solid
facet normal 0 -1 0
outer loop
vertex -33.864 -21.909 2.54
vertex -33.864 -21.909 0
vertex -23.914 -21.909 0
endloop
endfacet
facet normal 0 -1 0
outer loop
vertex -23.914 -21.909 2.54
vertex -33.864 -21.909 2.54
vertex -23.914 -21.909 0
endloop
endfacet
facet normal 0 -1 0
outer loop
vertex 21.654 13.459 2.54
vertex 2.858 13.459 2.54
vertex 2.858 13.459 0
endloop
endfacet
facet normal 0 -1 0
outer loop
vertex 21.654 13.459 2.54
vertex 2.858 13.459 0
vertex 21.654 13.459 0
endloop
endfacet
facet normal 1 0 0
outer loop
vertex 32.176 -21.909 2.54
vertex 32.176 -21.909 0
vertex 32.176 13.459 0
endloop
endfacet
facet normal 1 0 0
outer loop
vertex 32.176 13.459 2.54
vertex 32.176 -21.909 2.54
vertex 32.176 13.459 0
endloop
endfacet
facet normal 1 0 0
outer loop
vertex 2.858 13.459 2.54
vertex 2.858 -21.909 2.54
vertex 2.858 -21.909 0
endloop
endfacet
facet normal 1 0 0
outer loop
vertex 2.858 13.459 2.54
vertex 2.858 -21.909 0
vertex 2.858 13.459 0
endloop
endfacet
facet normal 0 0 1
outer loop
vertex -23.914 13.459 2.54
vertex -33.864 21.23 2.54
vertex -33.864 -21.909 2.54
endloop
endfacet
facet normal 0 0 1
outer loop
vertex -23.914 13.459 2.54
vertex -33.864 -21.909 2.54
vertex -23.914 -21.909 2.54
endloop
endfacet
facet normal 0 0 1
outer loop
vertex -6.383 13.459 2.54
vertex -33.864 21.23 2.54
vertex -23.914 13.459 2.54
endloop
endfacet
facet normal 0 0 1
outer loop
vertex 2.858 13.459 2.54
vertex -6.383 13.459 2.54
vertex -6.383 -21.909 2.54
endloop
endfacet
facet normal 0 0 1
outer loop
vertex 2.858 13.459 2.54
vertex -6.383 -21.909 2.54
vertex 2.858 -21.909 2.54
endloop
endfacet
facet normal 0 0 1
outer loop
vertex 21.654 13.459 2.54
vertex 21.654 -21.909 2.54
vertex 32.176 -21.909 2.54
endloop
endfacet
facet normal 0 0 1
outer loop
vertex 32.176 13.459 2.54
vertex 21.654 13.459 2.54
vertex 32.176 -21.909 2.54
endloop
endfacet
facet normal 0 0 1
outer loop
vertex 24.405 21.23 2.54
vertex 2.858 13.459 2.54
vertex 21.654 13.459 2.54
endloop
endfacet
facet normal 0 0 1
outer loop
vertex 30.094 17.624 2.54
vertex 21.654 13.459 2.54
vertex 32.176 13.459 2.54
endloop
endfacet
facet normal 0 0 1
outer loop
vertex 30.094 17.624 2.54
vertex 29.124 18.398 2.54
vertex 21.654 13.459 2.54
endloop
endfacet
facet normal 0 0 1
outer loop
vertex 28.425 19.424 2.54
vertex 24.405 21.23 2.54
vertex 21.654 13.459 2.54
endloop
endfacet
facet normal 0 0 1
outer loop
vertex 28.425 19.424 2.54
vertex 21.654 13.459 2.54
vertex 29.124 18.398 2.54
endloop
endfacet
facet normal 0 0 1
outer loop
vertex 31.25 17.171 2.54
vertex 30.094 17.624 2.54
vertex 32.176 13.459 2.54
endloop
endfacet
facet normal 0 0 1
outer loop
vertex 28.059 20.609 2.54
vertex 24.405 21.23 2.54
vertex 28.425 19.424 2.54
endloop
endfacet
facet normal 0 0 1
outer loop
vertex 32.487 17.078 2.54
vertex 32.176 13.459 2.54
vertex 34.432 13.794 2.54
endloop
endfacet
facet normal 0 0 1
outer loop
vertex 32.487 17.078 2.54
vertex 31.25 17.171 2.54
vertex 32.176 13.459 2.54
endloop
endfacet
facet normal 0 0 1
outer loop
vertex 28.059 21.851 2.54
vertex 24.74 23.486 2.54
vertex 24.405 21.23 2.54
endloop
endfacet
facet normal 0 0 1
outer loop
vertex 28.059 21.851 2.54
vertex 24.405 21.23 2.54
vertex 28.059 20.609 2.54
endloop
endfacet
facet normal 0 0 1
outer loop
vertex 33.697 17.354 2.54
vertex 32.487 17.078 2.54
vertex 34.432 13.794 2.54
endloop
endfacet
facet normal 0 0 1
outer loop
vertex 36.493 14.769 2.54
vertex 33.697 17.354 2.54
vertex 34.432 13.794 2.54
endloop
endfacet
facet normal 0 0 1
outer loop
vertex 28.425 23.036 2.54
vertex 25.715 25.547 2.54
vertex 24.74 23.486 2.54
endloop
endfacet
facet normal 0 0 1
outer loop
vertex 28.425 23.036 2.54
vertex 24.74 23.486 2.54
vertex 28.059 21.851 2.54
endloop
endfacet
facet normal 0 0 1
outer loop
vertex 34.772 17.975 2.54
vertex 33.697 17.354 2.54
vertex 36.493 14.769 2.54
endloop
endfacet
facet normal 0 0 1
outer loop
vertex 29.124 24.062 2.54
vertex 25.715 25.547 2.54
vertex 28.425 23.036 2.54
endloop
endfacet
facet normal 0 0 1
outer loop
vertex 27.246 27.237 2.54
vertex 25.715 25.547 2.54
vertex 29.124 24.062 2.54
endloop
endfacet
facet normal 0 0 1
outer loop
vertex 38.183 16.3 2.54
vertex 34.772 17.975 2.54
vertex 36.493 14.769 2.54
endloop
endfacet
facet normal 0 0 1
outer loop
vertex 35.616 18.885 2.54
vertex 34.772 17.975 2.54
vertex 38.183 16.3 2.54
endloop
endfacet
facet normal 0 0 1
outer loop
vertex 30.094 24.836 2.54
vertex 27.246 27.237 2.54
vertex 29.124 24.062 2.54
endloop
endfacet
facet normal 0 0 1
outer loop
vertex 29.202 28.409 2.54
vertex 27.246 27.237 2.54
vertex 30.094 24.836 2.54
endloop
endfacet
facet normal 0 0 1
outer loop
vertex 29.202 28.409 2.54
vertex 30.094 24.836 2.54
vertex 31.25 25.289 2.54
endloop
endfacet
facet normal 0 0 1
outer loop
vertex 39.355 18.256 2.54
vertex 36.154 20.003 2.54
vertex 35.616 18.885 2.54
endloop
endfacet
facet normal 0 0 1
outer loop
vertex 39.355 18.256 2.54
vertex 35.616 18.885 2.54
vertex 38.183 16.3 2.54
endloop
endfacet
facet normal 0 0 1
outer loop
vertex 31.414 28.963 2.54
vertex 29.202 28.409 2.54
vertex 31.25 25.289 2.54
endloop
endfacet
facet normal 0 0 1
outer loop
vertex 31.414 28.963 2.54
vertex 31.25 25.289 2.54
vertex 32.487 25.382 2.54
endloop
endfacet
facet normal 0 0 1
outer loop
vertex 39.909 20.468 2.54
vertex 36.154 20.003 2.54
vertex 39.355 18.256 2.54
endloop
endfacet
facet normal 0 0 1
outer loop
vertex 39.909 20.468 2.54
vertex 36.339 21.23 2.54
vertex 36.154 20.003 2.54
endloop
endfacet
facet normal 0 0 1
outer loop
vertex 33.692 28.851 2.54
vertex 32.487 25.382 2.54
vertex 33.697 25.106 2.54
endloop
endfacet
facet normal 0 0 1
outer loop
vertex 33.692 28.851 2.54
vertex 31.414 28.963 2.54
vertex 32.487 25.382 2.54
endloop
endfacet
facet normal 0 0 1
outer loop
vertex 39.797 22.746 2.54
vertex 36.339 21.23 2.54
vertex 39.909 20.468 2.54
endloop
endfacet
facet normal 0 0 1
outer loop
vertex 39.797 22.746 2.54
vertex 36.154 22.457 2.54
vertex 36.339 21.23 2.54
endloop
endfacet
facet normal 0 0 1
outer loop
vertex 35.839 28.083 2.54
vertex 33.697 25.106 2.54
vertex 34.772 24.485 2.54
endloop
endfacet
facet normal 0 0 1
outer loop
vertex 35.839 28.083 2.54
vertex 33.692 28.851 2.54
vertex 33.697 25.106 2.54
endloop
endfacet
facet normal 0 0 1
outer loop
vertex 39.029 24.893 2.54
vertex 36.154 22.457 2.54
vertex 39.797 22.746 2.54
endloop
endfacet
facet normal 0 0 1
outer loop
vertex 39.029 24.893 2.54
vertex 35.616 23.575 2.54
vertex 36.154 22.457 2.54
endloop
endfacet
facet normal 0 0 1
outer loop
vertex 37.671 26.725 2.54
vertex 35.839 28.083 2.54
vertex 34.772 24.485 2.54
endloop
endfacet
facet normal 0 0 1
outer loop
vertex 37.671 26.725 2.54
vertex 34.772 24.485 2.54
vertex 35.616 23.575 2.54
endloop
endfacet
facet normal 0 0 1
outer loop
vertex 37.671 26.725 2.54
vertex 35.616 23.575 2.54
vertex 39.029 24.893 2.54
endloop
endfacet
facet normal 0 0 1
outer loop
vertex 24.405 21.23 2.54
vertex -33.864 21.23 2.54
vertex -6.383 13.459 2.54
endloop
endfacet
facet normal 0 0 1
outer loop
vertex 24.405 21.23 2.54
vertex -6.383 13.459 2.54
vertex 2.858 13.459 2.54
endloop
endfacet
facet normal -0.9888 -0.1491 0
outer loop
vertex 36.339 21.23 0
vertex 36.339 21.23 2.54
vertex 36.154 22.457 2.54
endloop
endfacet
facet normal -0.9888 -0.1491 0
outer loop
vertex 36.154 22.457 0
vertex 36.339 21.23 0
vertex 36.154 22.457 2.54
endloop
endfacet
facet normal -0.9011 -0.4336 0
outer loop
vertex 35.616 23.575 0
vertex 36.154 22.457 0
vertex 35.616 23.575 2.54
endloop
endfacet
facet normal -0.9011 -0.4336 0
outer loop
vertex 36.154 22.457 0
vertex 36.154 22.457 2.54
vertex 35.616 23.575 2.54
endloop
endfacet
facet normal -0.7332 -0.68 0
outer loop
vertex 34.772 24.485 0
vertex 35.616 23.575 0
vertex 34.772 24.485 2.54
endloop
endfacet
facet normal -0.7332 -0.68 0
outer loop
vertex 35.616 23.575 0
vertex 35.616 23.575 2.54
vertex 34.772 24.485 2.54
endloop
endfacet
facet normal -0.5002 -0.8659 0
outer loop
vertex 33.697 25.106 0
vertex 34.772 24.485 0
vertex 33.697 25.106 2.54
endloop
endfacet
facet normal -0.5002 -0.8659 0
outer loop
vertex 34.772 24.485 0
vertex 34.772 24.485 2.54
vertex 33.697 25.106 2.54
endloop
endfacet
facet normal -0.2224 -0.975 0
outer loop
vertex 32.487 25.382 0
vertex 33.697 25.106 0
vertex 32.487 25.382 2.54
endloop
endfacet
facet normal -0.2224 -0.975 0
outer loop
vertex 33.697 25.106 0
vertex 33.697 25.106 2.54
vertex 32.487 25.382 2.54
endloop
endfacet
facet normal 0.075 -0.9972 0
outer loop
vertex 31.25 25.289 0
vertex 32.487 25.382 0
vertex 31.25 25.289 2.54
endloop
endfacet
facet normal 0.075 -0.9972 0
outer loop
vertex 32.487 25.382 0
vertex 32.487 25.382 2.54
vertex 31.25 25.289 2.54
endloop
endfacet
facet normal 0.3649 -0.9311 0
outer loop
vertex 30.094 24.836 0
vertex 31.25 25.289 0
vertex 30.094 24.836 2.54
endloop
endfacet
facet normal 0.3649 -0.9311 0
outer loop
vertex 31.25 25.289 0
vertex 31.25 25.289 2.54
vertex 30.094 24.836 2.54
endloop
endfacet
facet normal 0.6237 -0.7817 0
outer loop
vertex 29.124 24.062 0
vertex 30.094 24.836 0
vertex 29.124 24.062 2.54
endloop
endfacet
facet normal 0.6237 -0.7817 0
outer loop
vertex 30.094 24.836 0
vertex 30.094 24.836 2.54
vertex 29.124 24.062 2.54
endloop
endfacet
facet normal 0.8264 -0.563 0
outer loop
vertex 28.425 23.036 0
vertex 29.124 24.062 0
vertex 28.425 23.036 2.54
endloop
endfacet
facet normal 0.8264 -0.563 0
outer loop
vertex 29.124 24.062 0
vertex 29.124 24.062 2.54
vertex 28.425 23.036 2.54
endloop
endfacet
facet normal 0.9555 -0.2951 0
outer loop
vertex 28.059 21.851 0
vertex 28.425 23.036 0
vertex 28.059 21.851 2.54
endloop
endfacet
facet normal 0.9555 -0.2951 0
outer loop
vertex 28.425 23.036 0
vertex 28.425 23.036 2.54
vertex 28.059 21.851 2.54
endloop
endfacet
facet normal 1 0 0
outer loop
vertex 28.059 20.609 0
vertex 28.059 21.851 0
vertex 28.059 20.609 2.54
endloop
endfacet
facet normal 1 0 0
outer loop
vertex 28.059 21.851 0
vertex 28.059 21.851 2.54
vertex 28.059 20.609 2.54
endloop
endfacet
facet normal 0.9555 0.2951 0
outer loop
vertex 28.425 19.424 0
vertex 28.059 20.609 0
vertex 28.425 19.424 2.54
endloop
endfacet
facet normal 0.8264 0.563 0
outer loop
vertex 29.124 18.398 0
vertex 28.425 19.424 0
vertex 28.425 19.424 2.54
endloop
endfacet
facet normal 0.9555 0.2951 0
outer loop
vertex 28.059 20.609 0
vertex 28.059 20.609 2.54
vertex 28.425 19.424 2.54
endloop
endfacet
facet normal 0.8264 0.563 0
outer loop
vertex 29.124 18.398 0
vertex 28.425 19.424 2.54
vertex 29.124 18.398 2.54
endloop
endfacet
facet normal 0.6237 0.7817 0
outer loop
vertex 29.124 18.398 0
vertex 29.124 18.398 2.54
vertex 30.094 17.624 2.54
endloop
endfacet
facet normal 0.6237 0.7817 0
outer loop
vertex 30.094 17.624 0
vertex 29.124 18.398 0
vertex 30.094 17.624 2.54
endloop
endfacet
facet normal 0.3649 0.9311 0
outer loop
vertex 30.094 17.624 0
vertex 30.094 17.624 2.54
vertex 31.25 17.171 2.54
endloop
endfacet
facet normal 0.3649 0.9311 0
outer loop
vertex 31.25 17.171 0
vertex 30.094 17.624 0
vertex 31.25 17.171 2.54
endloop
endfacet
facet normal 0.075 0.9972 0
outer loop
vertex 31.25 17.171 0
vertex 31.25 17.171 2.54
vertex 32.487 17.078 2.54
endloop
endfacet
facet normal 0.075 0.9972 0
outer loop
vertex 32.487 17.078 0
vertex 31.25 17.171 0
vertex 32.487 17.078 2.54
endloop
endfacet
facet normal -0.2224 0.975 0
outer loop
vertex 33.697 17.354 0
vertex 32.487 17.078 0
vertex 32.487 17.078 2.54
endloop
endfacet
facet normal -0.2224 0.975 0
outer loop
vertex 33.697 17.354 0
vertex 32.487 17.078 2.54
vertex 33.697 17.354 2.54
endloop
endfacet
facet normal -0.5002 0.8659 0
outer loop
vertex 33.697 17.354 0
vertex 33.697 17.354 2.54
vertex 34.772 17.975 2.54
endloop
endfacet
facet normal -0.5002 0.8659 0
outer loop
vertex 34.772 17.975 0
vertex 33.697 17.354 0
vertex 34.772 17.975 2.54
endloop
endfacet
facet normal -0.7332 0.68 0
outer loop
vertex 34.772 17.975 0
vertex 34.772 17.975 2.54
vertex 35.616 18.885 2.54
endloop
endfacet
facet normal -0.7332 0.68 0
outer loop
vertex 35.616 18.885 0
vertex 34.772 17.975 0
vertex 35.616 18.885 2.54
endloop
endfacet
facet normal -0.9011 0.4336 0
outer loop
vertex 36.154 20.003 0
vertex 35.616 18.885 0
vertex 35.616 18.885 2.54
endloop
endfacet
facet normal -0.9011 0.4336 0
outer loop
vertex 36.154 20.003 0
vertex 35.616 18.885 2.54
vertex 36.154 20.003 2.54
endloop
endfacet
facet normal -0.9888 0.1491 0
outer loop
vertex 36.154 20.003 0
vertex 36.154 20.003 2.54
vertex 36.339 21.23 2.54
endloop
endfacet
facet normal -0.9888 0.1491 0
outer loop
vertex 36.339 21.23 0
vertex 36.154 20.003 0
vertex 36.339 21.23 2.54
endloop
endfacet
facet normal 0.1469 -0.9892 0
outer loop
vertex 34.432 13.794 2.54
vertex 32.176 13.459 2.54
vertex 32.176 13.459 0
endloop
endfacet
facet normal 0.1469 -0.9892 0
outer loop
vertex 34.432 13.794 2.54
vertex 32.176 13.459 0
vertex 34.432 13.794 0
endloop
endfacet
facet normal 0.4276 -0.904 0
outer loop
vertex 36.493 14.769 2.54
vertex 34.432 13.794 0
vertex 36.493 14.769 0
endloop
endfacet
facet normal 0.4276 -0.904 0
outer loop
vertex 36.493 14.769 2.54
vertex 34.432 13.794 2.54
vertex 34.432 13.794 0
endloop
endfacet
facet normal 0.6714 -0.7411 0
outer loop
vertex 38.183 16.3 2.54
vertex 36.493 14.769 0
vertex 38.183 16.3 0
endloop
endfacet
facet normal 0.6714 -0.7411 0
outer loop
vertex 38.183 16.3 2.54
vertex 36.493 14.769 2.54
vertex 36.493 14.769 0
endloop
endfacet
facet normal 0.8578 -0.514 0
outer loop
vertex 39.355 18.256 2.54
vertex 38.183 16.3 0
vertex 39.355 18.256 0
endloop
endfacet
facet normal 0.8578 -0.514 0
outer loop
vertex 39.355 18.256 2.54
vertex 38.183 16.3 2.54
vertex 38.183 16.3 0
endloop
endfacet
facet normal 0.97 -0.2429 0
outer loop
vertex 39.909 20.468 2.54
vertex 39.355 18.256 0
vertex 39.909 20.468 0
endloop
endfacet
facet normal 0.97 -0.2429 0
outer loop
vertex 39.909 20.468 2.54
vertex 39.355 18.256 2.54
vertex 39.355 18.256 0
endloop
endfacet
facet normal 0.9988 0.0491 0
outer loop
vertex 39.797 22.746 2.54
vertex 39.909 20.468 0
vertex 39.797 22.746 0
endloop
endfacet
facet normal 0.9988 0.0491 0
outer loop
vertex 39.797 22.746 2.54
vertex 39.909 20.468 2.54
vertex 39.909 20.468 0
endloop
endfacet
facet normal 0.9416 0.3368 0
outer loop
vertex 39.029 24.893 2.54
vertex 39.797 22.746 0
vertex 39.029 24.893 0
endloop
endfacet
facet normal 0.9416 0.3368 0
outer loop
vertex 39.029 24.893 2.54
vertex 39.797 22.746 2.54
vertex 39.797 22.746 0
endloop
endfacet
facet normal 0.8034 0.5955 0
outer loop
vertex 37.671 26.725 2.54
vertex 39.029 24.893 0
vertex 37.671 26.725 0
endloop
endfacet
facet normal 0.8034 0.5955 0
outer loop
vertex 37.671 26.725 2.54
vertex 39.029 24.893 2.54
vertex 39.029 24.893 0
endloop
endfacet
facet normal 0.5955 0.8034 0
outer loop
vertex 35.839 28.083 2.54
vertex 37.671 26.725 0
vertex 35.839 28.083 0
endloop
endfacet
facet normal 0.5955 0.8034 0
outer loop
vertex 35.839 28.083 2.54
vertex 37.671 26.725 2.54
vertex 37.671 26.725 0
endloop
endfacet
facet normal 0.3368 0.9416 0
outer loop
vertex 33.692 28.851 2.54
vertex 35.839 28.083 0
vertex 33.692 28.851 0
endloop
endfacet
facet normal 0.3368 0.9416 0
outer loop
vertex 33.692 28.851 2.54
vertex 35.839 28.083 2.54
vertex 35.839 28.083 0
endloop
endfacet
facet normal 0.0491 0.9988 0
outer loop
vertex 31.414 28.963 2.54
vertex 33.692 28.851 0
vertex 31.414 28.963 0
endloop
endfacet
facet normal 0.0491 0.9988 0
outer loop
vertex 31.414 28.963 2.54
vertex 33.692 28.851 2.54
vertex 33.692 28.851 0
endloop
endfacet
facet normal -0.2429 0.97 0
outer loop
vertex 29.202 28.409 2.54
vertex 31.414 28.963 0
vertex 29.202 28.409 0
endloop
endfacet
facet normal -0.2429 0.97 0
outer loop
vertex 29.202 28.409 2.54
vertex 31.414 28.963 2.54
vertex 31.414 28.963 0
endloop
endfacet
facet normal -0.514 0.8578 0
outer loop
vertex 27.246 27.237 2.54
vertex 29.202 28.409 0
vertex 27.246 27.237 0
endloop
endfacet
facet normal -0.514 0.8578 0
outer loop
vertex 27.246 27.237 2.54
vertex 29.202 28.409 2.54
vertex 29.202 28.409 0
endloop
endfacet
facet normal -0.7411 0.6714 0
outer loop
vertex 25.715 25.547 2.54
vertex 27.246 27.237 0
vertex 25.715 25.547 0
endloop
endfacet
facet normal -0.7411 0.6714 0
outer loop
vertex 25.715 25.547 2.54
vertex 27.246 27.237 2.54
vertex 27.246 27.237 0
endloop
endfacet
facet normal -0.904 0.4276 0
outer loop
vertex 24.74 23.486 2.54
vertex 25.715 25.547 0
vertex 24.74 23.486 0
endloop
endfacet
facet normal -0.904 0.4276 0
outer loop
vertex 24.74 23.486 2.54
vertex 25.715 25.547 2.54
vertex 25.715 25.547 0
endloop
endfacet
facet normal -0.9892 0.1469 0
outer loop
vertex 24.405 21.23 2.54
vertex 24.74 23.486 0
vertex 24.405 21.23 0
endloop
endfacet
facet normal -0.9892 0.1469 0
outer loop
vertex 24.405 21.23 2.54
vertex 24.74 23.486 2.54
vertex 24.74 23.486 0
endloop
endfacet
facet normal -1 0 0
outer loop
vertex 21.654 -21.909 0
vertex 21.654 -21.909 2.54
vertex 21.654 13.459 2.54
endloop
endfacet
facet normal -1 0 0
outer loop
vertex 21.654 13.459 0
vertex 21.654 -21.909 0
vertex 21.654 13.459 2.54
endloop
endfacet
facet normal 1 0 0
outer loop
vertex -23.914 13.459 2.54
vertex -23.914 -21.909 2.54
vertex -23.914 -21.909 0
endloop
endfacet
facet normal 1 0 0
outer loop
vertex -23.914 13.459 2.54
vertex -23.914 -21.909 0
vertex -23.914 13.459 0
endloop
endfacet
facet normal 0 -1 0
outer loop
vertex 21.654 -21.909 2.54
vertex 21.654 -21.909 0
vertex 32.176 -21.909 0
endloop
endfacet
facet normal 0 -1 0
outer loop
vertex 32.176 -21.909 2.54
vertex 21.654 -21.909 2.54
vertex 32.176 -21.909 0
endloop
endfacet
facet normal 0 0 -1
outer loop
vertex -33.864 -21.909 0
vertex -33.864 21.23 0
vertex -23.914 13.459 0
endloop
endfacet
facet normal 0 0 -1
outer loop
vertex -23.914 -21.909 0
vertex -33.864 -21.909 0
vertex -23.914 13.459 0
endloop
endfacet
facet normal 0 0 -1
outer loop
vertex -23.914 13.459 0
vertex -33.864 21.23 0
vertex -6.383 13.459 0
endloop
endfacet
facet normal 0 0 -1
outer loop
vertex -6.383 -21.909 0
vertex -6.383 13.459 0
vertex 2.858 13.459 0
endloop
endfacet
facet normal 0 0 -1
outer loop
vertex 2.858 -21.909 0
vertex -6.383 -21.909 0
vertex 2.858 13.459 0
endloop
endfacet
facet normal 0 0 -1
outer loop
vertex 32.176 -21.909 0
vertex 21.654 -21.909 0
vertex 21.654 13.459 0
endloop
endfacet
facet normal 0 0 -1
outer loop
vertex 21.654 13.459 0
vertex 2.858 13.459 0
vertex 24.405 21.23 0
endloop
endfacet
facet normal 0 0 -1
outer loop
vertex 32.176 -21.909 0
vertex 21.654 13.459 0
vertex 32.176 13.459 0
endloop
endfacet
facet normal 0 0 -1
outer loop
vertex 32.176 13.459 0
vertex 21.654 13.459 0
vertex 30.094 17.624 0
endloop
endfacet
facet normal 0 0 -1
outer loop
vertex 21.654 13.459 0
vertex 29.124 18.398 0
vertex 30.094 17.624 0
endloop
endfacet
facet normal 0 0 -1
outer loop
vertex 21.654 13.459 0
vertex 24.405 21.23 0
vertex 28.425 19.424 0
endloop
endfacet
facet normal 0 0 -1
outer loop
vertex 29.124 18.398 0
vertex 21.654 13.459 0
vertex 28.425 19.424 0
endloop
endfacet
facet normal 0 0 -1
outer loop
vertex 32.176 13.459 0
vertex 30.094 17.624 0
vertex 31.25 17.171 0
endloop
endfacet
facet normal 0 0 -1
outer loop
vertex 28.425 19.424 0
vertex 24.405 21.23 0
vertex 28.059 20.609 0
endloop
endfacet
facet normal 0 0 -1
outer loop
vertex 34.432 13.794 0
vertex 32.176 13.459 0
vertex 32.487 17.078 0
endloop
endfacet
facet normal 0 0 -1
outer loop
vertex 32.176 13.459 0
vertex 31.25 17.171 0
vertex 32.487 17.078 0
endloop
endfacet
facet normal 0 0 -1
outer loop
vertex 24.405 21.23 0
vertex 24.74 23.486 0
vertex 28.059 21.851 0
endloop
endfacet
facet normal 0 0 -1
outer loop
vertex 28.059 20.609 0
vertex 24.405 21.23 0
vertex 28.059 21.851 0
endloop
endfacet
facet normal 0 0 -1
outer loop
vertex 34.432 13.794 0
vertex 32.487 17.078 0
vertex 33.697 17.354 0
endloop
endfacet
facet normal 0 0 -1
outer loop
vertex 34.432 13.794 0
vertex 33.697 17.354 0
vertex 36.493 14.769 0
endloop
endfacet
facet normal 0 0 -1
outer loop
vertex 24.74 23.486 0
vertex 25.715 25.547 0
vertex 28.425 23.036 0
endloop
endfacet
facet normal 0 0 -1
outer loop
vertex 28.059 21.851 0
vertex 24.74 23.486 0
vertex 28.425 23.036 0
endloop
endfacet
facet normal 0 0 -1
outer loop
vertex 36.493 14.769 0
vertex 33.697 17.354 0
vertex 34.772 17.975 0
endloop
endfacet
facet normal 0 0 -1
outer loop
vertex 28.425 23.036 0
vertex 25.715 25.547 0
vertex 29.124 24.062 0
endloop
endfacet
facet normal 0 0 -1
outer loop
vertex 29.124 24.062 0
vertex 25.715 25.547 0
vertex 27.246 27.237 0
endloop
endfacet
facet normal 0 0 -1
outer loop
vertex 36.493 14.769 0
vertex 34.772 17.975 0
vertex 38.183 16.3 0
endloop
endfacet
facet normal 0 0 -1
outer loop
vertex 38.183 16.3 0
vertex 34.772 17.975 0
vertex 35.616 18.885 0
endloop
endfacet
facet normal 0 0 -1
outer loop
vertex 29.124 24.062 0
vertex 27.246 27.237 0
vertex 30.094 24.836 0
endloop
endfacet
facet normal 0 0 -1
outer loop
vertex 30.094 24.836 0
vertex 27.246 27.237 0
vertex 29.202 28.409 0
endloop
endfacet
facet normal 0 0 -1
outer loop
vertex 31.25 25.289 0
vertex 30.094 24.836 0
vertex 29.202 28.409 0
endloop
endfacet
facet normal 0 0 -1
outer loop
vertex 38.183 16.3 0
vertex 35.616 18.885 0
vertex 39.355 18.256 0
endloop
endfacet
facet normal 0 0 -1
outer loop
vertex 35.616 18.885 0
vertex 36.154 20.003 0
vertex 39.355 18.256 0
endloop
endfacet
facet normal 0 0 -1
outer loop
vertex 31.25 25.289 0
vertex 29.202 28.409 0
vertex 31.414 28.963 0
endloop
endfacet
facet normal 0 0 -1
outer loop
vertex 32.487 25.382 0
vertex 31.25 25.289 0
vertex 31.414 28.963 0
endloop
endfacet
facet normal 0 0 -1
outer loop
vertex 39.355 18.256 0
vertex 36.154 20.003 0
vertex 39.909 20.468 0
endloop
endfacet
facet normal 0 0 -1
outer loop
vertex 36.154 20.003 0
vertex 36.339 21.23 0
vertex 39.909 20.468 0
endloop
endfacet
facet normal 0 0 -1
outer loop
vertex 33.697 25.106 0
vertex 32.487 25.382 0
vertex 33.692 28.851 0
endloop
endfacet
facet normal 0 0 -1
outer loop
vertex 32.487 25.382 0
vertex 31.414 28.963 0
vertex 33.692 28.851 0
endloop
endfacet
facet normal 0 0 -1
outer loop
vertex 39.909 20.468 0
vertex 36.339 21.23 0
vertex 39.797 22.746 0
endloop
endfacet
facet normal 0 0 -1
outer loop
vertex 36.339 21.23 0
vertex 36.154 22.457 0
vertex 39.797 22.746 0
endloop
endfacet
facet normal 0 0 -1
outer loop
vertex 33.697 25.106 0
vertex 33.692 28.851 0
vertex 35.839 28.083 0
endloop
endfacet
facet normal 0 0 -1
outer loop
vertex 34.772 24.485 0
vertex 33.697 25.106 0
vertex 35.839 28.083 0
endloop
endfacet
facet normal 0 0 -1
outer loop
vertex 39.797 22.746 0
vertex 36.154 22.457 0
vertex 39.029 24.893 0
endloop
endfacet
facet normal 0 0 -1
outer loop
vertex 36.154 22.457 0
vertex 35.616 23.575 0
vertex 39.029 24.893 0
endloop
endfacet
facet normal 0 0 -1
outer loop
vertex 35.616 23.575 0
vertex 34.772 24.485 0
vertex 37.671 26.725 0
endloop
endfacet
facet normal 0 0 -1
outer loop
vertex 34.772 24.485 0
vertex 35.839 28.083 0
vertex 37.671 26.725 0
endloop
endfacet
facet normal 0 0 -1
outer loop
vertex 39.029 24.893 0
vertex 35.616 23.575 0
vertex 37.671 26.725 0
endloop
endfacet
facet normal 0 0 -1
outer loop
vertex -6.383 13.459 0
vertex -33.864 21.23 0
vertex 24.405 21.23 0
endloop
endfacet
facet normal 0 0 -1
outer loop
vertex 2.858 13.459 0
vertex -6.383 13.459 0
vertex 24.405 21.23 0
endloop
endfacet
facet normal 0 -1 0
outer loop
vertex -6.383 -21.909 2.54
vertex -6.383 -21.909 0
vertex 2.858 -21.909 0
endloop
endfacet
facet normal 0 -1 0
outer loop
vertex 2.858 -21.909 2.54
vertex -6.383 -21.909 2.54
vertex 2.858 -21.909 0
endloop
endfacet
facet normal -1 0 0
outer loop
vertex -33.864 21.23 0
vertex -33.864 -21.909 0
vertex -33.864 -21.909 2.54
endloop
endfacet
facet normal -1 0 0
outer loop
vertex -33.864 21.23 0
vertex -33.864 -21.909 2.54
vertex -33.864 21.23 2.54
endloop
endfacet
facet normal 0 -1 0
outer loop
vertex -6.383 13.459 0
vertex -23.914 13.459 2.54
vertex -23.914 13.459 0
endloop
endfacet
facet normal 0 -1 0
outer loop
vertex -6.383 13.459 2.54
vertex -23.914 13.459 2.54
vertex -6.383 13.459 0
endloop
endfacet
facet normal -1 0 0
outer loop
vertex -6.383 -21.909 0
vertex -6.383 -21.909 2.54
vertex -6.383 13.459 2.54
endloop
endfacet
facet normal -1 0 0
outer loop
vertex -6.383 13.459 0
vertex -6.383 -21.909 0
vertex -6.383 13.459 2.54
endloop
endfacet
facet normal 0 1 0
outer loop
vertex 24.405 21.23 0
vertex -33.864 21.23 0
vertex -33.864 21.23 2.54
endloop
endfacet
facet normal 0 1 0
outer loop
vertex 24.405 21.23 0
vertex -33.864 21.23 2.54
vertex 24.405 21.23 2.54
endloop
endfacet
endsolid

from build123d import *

# Parameters (mm, degrees)
F0_W     = 66.04
F0_H     = 43.139034
F1_DEPTH = 2.54
F2_W     = 18.795862
F2_H     = 35.368388
F3_DEPTH = 25.4
F4_W     = 17.531056
F4_H     = 35.368388
F5_DEPTH = 25.4
F6_R     = 7.770645
F7_DEPTH = 2.54
F8_R     = 4.163339
F9_DEPTH = 25.4


with BuildPart() as f1:
    # F0 (on Top) → F1 (new body)
    with BuildSketch(Plane.XY):
        with Locations((-0.843987, -0.339514)):
            Rectangle(F0_W, F0_H)
    extrude(amount=F1_DEPTH)

    # F2 (on face) → F3 (cut)
    with BuildSketch(Plane.XY.offset(2.54)):
        with Locations((12.255906, -4.224837)):
            Rectangle(F2_W, F2_H)
    extrude(amount=-F3_DEPTH, mode=Mode.SUBTRACT)

    # F4 (on face) → F5 (cut)
    with BuildSketch(Plane.XY.offset(2.54)):
        with Locations((-15.148921, -4.224837)):
            Rectangle(F4_W, F4_H)
    extrude(amount=-F5_DEPTH, mode=Mode.SUBTRACT)

    # F6 (on face) → F7 (join)
    with BuildSketch(Plane.XY.offset(2.54)):
        with Locations((32.176013, 21.230003)):
            Circle(F6_R)
    extrude(amount=-F7_DEPTH)

    # F8 (on face) → F9 (cut)
    with BuildSketch(Plane.XY.offset(2.54)):
        with Locations((32.176013, 21.230003)):
            Circle(F8_R)
    extrude(amount=-F9_DEPTH, mode=Mode.SUBTRACT)


solid = f1.part
